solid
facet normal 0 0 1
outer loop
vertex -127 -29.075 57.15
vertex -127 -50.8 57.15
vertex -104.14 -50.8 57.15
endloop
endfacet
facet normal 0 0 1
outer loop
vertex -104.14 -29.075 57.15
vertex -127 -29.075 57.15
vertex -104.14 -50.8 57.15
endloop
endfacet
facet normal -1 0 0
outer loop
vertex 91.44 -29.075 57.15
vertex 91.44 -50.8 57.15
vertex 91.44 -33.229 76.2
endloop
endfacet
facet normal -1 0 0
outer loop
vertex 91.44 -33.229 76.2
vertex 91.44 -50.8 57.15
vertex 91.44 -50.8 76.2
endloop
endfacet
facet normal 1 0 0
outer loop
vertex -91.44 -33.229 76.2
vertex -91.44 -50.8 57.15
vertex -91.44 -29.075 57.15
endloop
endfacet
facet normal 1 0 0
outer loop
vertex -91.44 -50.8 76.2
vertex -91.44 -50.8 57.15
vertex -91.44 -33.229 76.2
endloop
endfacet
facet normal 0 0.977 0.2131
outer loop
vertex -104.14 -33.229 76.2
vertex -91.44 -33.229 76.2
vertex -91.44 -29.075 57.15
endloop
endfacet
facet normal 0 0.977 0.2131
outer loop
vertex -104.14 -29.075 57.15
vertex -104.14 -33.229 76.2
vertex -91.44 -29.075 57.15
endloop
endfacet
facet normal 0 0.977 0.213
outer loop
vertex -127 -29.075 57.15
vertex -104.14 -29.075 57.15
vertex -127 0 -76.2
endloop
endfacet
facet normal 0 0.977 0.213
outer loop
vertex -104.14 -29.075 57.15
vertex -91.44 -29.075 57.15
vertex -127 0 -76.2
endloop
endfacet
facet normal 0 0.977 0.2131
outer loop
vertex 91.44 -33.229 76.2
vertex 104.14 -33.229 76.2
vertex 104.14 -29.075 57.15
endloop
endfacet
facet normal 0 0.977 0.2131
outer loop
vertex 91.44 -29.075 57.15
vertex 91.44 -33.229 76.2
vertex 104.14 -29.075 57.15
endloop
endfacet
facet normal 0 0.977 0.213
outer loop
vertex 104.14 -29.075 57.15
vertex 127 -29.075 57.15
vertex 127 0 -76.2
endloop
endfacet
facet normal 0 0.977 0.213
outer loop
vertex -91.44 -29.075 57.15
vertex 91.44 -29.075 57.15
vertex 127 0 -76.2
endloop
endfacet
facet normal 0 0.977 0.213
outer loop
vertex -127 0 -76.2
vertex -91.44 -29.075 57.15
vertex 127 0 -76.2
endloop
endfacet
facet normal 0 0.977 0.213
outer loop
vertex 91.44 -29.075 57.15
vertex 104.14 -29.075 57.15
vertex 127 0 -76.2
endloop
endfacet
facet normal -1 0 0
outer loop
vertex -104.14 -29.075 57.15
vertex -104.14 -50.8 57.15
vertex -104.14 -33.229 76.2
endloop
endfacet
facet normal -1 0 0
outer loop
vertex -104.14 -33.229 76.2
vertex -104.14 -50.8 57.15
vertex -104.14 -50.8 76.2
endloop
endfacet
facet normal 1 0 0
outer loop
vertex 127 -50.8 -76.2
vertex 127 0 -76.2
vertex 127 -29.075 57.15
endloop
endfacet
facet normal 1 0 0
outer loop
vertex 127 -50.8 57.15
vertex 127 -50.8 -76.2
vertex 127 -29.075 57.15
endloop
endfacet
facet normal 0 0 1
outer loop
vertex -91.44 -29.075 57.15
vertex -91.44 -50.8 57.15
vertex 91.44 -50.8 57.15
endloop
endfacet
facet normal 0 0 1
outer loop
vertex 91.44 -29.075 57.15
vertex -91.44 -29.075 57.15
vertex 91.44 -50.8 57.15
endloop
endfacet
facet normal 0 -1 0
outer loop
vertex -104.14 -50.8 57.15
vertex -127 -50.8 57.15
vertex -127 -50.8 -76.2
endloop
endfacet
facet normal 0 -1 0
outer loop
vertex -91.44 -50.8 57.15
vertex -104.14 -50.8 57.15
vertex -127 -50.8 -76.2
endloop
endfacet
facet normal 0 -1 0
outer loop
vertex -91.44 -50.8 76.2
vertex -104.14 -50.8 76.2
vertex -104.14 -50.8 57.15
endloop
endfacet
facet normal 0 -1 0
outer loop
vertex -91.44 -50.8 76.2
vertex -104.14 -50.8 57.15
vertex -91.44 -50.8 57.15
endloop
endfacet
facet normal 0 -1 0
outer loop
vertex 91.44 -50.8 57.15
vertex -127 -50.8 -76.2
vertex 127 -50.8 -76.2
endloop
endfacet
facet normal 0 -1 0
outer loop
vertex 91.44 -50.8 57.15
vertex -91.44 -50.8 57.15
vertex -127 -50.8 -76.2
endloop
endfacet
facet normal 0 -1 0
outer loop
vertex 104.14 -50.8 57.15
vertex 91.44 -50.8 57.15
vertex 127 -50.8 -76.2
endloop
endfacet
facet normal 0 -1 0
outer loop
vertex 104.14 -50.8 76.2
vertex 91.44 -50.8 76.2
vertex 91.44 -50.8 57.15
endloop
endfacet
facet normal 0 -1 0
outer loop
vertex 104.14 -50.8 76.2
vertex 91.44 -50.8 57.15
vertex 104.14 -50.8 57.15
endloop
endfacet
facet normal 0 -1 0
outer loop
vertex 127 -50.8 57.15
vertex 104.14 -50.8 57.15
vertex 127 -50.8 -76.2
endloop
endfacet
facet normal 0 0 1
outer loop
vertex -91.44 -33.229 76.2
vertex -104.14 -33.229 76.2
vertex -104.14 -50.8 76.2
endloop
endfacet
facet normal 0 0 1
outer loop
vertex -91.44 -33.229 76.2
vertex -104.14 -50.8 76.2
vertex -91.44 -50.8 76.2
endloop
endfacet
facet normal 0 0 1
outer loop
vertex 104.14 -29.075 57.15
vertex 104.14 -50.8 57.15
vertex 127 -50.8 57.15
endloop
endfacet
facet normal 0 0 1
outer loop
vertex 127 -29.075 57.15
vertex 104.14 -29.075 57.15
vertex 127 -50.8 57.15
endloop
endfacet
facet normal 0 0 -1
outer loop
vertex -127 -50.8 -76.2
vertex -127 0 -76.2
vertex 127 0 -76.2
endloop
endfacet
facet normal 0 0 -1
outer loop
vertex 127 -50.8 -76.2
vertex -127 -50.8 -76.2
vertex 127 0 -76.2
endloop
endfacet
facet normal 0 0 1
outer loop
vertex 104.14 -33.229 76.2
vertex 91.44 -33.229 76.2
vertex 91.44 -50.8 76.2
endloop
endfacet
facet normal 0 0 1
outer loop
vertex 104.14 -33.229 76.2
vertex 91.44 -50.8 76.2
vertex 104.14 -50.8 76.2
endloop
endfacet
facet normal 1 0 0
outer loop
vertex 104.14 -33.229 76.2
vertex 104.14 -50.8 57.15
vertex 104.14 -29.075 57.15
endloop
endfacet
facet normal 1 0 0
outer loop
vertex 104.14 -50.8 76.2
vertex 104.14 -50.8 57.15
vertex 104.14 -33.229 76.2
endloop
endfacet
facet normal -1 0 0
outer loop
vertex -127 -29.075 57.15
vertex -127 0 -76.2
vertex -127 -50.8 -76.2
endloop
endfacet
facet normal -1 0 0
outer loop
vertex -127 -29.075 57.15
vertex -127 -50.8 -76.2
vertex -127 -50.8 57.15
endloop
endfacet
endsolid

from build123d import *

# Parameters (mm, degrees)
F0_W     = 254
F0_H     = 152.4
F1_DEPTH = 50.8
F3_DEPTH = 254.001
F4_W     = 22.86
F4_H     = 19.05
F4_W_2   = 182.88
F5_DEPTH = 50.801


with BuildPart() as f1:
    # F0 (on Front) → F1 (new body)
    with BuildSketch(Plane.XZ):
        Rectangle(F0_W, F0_H)
    extrude(amount=F1_DEPTH)

    # F2 (on face) → F3 (cut, through all)
    with BuildSketch(Plane.YZ.offset(127)):
        Polygon((-33.228574, 76.2), (0, -76.2), (0, 76.2), align=None)
    extrude(amount=-F3_DEPTH, mode=Mode.SUBTRACT)

    # F4 (on face) → F5 (cut, through all)
    with BuildSketch(Plane.XZ.offset(50.8)):
        with Locations((-115.57, 66.675)):
            Rectangle(F4_W, F4_H)
        with Locations((0, 66.675)):
            Rectangle(F4_W_2, F4_H)
        with Locations((115.57, 66.675)):
            Rectangle(F4_W, F4_H)
    extrude(amount=-F5_DEPTH, mode=Mode.SUBTRACT)


solid = f1.part
